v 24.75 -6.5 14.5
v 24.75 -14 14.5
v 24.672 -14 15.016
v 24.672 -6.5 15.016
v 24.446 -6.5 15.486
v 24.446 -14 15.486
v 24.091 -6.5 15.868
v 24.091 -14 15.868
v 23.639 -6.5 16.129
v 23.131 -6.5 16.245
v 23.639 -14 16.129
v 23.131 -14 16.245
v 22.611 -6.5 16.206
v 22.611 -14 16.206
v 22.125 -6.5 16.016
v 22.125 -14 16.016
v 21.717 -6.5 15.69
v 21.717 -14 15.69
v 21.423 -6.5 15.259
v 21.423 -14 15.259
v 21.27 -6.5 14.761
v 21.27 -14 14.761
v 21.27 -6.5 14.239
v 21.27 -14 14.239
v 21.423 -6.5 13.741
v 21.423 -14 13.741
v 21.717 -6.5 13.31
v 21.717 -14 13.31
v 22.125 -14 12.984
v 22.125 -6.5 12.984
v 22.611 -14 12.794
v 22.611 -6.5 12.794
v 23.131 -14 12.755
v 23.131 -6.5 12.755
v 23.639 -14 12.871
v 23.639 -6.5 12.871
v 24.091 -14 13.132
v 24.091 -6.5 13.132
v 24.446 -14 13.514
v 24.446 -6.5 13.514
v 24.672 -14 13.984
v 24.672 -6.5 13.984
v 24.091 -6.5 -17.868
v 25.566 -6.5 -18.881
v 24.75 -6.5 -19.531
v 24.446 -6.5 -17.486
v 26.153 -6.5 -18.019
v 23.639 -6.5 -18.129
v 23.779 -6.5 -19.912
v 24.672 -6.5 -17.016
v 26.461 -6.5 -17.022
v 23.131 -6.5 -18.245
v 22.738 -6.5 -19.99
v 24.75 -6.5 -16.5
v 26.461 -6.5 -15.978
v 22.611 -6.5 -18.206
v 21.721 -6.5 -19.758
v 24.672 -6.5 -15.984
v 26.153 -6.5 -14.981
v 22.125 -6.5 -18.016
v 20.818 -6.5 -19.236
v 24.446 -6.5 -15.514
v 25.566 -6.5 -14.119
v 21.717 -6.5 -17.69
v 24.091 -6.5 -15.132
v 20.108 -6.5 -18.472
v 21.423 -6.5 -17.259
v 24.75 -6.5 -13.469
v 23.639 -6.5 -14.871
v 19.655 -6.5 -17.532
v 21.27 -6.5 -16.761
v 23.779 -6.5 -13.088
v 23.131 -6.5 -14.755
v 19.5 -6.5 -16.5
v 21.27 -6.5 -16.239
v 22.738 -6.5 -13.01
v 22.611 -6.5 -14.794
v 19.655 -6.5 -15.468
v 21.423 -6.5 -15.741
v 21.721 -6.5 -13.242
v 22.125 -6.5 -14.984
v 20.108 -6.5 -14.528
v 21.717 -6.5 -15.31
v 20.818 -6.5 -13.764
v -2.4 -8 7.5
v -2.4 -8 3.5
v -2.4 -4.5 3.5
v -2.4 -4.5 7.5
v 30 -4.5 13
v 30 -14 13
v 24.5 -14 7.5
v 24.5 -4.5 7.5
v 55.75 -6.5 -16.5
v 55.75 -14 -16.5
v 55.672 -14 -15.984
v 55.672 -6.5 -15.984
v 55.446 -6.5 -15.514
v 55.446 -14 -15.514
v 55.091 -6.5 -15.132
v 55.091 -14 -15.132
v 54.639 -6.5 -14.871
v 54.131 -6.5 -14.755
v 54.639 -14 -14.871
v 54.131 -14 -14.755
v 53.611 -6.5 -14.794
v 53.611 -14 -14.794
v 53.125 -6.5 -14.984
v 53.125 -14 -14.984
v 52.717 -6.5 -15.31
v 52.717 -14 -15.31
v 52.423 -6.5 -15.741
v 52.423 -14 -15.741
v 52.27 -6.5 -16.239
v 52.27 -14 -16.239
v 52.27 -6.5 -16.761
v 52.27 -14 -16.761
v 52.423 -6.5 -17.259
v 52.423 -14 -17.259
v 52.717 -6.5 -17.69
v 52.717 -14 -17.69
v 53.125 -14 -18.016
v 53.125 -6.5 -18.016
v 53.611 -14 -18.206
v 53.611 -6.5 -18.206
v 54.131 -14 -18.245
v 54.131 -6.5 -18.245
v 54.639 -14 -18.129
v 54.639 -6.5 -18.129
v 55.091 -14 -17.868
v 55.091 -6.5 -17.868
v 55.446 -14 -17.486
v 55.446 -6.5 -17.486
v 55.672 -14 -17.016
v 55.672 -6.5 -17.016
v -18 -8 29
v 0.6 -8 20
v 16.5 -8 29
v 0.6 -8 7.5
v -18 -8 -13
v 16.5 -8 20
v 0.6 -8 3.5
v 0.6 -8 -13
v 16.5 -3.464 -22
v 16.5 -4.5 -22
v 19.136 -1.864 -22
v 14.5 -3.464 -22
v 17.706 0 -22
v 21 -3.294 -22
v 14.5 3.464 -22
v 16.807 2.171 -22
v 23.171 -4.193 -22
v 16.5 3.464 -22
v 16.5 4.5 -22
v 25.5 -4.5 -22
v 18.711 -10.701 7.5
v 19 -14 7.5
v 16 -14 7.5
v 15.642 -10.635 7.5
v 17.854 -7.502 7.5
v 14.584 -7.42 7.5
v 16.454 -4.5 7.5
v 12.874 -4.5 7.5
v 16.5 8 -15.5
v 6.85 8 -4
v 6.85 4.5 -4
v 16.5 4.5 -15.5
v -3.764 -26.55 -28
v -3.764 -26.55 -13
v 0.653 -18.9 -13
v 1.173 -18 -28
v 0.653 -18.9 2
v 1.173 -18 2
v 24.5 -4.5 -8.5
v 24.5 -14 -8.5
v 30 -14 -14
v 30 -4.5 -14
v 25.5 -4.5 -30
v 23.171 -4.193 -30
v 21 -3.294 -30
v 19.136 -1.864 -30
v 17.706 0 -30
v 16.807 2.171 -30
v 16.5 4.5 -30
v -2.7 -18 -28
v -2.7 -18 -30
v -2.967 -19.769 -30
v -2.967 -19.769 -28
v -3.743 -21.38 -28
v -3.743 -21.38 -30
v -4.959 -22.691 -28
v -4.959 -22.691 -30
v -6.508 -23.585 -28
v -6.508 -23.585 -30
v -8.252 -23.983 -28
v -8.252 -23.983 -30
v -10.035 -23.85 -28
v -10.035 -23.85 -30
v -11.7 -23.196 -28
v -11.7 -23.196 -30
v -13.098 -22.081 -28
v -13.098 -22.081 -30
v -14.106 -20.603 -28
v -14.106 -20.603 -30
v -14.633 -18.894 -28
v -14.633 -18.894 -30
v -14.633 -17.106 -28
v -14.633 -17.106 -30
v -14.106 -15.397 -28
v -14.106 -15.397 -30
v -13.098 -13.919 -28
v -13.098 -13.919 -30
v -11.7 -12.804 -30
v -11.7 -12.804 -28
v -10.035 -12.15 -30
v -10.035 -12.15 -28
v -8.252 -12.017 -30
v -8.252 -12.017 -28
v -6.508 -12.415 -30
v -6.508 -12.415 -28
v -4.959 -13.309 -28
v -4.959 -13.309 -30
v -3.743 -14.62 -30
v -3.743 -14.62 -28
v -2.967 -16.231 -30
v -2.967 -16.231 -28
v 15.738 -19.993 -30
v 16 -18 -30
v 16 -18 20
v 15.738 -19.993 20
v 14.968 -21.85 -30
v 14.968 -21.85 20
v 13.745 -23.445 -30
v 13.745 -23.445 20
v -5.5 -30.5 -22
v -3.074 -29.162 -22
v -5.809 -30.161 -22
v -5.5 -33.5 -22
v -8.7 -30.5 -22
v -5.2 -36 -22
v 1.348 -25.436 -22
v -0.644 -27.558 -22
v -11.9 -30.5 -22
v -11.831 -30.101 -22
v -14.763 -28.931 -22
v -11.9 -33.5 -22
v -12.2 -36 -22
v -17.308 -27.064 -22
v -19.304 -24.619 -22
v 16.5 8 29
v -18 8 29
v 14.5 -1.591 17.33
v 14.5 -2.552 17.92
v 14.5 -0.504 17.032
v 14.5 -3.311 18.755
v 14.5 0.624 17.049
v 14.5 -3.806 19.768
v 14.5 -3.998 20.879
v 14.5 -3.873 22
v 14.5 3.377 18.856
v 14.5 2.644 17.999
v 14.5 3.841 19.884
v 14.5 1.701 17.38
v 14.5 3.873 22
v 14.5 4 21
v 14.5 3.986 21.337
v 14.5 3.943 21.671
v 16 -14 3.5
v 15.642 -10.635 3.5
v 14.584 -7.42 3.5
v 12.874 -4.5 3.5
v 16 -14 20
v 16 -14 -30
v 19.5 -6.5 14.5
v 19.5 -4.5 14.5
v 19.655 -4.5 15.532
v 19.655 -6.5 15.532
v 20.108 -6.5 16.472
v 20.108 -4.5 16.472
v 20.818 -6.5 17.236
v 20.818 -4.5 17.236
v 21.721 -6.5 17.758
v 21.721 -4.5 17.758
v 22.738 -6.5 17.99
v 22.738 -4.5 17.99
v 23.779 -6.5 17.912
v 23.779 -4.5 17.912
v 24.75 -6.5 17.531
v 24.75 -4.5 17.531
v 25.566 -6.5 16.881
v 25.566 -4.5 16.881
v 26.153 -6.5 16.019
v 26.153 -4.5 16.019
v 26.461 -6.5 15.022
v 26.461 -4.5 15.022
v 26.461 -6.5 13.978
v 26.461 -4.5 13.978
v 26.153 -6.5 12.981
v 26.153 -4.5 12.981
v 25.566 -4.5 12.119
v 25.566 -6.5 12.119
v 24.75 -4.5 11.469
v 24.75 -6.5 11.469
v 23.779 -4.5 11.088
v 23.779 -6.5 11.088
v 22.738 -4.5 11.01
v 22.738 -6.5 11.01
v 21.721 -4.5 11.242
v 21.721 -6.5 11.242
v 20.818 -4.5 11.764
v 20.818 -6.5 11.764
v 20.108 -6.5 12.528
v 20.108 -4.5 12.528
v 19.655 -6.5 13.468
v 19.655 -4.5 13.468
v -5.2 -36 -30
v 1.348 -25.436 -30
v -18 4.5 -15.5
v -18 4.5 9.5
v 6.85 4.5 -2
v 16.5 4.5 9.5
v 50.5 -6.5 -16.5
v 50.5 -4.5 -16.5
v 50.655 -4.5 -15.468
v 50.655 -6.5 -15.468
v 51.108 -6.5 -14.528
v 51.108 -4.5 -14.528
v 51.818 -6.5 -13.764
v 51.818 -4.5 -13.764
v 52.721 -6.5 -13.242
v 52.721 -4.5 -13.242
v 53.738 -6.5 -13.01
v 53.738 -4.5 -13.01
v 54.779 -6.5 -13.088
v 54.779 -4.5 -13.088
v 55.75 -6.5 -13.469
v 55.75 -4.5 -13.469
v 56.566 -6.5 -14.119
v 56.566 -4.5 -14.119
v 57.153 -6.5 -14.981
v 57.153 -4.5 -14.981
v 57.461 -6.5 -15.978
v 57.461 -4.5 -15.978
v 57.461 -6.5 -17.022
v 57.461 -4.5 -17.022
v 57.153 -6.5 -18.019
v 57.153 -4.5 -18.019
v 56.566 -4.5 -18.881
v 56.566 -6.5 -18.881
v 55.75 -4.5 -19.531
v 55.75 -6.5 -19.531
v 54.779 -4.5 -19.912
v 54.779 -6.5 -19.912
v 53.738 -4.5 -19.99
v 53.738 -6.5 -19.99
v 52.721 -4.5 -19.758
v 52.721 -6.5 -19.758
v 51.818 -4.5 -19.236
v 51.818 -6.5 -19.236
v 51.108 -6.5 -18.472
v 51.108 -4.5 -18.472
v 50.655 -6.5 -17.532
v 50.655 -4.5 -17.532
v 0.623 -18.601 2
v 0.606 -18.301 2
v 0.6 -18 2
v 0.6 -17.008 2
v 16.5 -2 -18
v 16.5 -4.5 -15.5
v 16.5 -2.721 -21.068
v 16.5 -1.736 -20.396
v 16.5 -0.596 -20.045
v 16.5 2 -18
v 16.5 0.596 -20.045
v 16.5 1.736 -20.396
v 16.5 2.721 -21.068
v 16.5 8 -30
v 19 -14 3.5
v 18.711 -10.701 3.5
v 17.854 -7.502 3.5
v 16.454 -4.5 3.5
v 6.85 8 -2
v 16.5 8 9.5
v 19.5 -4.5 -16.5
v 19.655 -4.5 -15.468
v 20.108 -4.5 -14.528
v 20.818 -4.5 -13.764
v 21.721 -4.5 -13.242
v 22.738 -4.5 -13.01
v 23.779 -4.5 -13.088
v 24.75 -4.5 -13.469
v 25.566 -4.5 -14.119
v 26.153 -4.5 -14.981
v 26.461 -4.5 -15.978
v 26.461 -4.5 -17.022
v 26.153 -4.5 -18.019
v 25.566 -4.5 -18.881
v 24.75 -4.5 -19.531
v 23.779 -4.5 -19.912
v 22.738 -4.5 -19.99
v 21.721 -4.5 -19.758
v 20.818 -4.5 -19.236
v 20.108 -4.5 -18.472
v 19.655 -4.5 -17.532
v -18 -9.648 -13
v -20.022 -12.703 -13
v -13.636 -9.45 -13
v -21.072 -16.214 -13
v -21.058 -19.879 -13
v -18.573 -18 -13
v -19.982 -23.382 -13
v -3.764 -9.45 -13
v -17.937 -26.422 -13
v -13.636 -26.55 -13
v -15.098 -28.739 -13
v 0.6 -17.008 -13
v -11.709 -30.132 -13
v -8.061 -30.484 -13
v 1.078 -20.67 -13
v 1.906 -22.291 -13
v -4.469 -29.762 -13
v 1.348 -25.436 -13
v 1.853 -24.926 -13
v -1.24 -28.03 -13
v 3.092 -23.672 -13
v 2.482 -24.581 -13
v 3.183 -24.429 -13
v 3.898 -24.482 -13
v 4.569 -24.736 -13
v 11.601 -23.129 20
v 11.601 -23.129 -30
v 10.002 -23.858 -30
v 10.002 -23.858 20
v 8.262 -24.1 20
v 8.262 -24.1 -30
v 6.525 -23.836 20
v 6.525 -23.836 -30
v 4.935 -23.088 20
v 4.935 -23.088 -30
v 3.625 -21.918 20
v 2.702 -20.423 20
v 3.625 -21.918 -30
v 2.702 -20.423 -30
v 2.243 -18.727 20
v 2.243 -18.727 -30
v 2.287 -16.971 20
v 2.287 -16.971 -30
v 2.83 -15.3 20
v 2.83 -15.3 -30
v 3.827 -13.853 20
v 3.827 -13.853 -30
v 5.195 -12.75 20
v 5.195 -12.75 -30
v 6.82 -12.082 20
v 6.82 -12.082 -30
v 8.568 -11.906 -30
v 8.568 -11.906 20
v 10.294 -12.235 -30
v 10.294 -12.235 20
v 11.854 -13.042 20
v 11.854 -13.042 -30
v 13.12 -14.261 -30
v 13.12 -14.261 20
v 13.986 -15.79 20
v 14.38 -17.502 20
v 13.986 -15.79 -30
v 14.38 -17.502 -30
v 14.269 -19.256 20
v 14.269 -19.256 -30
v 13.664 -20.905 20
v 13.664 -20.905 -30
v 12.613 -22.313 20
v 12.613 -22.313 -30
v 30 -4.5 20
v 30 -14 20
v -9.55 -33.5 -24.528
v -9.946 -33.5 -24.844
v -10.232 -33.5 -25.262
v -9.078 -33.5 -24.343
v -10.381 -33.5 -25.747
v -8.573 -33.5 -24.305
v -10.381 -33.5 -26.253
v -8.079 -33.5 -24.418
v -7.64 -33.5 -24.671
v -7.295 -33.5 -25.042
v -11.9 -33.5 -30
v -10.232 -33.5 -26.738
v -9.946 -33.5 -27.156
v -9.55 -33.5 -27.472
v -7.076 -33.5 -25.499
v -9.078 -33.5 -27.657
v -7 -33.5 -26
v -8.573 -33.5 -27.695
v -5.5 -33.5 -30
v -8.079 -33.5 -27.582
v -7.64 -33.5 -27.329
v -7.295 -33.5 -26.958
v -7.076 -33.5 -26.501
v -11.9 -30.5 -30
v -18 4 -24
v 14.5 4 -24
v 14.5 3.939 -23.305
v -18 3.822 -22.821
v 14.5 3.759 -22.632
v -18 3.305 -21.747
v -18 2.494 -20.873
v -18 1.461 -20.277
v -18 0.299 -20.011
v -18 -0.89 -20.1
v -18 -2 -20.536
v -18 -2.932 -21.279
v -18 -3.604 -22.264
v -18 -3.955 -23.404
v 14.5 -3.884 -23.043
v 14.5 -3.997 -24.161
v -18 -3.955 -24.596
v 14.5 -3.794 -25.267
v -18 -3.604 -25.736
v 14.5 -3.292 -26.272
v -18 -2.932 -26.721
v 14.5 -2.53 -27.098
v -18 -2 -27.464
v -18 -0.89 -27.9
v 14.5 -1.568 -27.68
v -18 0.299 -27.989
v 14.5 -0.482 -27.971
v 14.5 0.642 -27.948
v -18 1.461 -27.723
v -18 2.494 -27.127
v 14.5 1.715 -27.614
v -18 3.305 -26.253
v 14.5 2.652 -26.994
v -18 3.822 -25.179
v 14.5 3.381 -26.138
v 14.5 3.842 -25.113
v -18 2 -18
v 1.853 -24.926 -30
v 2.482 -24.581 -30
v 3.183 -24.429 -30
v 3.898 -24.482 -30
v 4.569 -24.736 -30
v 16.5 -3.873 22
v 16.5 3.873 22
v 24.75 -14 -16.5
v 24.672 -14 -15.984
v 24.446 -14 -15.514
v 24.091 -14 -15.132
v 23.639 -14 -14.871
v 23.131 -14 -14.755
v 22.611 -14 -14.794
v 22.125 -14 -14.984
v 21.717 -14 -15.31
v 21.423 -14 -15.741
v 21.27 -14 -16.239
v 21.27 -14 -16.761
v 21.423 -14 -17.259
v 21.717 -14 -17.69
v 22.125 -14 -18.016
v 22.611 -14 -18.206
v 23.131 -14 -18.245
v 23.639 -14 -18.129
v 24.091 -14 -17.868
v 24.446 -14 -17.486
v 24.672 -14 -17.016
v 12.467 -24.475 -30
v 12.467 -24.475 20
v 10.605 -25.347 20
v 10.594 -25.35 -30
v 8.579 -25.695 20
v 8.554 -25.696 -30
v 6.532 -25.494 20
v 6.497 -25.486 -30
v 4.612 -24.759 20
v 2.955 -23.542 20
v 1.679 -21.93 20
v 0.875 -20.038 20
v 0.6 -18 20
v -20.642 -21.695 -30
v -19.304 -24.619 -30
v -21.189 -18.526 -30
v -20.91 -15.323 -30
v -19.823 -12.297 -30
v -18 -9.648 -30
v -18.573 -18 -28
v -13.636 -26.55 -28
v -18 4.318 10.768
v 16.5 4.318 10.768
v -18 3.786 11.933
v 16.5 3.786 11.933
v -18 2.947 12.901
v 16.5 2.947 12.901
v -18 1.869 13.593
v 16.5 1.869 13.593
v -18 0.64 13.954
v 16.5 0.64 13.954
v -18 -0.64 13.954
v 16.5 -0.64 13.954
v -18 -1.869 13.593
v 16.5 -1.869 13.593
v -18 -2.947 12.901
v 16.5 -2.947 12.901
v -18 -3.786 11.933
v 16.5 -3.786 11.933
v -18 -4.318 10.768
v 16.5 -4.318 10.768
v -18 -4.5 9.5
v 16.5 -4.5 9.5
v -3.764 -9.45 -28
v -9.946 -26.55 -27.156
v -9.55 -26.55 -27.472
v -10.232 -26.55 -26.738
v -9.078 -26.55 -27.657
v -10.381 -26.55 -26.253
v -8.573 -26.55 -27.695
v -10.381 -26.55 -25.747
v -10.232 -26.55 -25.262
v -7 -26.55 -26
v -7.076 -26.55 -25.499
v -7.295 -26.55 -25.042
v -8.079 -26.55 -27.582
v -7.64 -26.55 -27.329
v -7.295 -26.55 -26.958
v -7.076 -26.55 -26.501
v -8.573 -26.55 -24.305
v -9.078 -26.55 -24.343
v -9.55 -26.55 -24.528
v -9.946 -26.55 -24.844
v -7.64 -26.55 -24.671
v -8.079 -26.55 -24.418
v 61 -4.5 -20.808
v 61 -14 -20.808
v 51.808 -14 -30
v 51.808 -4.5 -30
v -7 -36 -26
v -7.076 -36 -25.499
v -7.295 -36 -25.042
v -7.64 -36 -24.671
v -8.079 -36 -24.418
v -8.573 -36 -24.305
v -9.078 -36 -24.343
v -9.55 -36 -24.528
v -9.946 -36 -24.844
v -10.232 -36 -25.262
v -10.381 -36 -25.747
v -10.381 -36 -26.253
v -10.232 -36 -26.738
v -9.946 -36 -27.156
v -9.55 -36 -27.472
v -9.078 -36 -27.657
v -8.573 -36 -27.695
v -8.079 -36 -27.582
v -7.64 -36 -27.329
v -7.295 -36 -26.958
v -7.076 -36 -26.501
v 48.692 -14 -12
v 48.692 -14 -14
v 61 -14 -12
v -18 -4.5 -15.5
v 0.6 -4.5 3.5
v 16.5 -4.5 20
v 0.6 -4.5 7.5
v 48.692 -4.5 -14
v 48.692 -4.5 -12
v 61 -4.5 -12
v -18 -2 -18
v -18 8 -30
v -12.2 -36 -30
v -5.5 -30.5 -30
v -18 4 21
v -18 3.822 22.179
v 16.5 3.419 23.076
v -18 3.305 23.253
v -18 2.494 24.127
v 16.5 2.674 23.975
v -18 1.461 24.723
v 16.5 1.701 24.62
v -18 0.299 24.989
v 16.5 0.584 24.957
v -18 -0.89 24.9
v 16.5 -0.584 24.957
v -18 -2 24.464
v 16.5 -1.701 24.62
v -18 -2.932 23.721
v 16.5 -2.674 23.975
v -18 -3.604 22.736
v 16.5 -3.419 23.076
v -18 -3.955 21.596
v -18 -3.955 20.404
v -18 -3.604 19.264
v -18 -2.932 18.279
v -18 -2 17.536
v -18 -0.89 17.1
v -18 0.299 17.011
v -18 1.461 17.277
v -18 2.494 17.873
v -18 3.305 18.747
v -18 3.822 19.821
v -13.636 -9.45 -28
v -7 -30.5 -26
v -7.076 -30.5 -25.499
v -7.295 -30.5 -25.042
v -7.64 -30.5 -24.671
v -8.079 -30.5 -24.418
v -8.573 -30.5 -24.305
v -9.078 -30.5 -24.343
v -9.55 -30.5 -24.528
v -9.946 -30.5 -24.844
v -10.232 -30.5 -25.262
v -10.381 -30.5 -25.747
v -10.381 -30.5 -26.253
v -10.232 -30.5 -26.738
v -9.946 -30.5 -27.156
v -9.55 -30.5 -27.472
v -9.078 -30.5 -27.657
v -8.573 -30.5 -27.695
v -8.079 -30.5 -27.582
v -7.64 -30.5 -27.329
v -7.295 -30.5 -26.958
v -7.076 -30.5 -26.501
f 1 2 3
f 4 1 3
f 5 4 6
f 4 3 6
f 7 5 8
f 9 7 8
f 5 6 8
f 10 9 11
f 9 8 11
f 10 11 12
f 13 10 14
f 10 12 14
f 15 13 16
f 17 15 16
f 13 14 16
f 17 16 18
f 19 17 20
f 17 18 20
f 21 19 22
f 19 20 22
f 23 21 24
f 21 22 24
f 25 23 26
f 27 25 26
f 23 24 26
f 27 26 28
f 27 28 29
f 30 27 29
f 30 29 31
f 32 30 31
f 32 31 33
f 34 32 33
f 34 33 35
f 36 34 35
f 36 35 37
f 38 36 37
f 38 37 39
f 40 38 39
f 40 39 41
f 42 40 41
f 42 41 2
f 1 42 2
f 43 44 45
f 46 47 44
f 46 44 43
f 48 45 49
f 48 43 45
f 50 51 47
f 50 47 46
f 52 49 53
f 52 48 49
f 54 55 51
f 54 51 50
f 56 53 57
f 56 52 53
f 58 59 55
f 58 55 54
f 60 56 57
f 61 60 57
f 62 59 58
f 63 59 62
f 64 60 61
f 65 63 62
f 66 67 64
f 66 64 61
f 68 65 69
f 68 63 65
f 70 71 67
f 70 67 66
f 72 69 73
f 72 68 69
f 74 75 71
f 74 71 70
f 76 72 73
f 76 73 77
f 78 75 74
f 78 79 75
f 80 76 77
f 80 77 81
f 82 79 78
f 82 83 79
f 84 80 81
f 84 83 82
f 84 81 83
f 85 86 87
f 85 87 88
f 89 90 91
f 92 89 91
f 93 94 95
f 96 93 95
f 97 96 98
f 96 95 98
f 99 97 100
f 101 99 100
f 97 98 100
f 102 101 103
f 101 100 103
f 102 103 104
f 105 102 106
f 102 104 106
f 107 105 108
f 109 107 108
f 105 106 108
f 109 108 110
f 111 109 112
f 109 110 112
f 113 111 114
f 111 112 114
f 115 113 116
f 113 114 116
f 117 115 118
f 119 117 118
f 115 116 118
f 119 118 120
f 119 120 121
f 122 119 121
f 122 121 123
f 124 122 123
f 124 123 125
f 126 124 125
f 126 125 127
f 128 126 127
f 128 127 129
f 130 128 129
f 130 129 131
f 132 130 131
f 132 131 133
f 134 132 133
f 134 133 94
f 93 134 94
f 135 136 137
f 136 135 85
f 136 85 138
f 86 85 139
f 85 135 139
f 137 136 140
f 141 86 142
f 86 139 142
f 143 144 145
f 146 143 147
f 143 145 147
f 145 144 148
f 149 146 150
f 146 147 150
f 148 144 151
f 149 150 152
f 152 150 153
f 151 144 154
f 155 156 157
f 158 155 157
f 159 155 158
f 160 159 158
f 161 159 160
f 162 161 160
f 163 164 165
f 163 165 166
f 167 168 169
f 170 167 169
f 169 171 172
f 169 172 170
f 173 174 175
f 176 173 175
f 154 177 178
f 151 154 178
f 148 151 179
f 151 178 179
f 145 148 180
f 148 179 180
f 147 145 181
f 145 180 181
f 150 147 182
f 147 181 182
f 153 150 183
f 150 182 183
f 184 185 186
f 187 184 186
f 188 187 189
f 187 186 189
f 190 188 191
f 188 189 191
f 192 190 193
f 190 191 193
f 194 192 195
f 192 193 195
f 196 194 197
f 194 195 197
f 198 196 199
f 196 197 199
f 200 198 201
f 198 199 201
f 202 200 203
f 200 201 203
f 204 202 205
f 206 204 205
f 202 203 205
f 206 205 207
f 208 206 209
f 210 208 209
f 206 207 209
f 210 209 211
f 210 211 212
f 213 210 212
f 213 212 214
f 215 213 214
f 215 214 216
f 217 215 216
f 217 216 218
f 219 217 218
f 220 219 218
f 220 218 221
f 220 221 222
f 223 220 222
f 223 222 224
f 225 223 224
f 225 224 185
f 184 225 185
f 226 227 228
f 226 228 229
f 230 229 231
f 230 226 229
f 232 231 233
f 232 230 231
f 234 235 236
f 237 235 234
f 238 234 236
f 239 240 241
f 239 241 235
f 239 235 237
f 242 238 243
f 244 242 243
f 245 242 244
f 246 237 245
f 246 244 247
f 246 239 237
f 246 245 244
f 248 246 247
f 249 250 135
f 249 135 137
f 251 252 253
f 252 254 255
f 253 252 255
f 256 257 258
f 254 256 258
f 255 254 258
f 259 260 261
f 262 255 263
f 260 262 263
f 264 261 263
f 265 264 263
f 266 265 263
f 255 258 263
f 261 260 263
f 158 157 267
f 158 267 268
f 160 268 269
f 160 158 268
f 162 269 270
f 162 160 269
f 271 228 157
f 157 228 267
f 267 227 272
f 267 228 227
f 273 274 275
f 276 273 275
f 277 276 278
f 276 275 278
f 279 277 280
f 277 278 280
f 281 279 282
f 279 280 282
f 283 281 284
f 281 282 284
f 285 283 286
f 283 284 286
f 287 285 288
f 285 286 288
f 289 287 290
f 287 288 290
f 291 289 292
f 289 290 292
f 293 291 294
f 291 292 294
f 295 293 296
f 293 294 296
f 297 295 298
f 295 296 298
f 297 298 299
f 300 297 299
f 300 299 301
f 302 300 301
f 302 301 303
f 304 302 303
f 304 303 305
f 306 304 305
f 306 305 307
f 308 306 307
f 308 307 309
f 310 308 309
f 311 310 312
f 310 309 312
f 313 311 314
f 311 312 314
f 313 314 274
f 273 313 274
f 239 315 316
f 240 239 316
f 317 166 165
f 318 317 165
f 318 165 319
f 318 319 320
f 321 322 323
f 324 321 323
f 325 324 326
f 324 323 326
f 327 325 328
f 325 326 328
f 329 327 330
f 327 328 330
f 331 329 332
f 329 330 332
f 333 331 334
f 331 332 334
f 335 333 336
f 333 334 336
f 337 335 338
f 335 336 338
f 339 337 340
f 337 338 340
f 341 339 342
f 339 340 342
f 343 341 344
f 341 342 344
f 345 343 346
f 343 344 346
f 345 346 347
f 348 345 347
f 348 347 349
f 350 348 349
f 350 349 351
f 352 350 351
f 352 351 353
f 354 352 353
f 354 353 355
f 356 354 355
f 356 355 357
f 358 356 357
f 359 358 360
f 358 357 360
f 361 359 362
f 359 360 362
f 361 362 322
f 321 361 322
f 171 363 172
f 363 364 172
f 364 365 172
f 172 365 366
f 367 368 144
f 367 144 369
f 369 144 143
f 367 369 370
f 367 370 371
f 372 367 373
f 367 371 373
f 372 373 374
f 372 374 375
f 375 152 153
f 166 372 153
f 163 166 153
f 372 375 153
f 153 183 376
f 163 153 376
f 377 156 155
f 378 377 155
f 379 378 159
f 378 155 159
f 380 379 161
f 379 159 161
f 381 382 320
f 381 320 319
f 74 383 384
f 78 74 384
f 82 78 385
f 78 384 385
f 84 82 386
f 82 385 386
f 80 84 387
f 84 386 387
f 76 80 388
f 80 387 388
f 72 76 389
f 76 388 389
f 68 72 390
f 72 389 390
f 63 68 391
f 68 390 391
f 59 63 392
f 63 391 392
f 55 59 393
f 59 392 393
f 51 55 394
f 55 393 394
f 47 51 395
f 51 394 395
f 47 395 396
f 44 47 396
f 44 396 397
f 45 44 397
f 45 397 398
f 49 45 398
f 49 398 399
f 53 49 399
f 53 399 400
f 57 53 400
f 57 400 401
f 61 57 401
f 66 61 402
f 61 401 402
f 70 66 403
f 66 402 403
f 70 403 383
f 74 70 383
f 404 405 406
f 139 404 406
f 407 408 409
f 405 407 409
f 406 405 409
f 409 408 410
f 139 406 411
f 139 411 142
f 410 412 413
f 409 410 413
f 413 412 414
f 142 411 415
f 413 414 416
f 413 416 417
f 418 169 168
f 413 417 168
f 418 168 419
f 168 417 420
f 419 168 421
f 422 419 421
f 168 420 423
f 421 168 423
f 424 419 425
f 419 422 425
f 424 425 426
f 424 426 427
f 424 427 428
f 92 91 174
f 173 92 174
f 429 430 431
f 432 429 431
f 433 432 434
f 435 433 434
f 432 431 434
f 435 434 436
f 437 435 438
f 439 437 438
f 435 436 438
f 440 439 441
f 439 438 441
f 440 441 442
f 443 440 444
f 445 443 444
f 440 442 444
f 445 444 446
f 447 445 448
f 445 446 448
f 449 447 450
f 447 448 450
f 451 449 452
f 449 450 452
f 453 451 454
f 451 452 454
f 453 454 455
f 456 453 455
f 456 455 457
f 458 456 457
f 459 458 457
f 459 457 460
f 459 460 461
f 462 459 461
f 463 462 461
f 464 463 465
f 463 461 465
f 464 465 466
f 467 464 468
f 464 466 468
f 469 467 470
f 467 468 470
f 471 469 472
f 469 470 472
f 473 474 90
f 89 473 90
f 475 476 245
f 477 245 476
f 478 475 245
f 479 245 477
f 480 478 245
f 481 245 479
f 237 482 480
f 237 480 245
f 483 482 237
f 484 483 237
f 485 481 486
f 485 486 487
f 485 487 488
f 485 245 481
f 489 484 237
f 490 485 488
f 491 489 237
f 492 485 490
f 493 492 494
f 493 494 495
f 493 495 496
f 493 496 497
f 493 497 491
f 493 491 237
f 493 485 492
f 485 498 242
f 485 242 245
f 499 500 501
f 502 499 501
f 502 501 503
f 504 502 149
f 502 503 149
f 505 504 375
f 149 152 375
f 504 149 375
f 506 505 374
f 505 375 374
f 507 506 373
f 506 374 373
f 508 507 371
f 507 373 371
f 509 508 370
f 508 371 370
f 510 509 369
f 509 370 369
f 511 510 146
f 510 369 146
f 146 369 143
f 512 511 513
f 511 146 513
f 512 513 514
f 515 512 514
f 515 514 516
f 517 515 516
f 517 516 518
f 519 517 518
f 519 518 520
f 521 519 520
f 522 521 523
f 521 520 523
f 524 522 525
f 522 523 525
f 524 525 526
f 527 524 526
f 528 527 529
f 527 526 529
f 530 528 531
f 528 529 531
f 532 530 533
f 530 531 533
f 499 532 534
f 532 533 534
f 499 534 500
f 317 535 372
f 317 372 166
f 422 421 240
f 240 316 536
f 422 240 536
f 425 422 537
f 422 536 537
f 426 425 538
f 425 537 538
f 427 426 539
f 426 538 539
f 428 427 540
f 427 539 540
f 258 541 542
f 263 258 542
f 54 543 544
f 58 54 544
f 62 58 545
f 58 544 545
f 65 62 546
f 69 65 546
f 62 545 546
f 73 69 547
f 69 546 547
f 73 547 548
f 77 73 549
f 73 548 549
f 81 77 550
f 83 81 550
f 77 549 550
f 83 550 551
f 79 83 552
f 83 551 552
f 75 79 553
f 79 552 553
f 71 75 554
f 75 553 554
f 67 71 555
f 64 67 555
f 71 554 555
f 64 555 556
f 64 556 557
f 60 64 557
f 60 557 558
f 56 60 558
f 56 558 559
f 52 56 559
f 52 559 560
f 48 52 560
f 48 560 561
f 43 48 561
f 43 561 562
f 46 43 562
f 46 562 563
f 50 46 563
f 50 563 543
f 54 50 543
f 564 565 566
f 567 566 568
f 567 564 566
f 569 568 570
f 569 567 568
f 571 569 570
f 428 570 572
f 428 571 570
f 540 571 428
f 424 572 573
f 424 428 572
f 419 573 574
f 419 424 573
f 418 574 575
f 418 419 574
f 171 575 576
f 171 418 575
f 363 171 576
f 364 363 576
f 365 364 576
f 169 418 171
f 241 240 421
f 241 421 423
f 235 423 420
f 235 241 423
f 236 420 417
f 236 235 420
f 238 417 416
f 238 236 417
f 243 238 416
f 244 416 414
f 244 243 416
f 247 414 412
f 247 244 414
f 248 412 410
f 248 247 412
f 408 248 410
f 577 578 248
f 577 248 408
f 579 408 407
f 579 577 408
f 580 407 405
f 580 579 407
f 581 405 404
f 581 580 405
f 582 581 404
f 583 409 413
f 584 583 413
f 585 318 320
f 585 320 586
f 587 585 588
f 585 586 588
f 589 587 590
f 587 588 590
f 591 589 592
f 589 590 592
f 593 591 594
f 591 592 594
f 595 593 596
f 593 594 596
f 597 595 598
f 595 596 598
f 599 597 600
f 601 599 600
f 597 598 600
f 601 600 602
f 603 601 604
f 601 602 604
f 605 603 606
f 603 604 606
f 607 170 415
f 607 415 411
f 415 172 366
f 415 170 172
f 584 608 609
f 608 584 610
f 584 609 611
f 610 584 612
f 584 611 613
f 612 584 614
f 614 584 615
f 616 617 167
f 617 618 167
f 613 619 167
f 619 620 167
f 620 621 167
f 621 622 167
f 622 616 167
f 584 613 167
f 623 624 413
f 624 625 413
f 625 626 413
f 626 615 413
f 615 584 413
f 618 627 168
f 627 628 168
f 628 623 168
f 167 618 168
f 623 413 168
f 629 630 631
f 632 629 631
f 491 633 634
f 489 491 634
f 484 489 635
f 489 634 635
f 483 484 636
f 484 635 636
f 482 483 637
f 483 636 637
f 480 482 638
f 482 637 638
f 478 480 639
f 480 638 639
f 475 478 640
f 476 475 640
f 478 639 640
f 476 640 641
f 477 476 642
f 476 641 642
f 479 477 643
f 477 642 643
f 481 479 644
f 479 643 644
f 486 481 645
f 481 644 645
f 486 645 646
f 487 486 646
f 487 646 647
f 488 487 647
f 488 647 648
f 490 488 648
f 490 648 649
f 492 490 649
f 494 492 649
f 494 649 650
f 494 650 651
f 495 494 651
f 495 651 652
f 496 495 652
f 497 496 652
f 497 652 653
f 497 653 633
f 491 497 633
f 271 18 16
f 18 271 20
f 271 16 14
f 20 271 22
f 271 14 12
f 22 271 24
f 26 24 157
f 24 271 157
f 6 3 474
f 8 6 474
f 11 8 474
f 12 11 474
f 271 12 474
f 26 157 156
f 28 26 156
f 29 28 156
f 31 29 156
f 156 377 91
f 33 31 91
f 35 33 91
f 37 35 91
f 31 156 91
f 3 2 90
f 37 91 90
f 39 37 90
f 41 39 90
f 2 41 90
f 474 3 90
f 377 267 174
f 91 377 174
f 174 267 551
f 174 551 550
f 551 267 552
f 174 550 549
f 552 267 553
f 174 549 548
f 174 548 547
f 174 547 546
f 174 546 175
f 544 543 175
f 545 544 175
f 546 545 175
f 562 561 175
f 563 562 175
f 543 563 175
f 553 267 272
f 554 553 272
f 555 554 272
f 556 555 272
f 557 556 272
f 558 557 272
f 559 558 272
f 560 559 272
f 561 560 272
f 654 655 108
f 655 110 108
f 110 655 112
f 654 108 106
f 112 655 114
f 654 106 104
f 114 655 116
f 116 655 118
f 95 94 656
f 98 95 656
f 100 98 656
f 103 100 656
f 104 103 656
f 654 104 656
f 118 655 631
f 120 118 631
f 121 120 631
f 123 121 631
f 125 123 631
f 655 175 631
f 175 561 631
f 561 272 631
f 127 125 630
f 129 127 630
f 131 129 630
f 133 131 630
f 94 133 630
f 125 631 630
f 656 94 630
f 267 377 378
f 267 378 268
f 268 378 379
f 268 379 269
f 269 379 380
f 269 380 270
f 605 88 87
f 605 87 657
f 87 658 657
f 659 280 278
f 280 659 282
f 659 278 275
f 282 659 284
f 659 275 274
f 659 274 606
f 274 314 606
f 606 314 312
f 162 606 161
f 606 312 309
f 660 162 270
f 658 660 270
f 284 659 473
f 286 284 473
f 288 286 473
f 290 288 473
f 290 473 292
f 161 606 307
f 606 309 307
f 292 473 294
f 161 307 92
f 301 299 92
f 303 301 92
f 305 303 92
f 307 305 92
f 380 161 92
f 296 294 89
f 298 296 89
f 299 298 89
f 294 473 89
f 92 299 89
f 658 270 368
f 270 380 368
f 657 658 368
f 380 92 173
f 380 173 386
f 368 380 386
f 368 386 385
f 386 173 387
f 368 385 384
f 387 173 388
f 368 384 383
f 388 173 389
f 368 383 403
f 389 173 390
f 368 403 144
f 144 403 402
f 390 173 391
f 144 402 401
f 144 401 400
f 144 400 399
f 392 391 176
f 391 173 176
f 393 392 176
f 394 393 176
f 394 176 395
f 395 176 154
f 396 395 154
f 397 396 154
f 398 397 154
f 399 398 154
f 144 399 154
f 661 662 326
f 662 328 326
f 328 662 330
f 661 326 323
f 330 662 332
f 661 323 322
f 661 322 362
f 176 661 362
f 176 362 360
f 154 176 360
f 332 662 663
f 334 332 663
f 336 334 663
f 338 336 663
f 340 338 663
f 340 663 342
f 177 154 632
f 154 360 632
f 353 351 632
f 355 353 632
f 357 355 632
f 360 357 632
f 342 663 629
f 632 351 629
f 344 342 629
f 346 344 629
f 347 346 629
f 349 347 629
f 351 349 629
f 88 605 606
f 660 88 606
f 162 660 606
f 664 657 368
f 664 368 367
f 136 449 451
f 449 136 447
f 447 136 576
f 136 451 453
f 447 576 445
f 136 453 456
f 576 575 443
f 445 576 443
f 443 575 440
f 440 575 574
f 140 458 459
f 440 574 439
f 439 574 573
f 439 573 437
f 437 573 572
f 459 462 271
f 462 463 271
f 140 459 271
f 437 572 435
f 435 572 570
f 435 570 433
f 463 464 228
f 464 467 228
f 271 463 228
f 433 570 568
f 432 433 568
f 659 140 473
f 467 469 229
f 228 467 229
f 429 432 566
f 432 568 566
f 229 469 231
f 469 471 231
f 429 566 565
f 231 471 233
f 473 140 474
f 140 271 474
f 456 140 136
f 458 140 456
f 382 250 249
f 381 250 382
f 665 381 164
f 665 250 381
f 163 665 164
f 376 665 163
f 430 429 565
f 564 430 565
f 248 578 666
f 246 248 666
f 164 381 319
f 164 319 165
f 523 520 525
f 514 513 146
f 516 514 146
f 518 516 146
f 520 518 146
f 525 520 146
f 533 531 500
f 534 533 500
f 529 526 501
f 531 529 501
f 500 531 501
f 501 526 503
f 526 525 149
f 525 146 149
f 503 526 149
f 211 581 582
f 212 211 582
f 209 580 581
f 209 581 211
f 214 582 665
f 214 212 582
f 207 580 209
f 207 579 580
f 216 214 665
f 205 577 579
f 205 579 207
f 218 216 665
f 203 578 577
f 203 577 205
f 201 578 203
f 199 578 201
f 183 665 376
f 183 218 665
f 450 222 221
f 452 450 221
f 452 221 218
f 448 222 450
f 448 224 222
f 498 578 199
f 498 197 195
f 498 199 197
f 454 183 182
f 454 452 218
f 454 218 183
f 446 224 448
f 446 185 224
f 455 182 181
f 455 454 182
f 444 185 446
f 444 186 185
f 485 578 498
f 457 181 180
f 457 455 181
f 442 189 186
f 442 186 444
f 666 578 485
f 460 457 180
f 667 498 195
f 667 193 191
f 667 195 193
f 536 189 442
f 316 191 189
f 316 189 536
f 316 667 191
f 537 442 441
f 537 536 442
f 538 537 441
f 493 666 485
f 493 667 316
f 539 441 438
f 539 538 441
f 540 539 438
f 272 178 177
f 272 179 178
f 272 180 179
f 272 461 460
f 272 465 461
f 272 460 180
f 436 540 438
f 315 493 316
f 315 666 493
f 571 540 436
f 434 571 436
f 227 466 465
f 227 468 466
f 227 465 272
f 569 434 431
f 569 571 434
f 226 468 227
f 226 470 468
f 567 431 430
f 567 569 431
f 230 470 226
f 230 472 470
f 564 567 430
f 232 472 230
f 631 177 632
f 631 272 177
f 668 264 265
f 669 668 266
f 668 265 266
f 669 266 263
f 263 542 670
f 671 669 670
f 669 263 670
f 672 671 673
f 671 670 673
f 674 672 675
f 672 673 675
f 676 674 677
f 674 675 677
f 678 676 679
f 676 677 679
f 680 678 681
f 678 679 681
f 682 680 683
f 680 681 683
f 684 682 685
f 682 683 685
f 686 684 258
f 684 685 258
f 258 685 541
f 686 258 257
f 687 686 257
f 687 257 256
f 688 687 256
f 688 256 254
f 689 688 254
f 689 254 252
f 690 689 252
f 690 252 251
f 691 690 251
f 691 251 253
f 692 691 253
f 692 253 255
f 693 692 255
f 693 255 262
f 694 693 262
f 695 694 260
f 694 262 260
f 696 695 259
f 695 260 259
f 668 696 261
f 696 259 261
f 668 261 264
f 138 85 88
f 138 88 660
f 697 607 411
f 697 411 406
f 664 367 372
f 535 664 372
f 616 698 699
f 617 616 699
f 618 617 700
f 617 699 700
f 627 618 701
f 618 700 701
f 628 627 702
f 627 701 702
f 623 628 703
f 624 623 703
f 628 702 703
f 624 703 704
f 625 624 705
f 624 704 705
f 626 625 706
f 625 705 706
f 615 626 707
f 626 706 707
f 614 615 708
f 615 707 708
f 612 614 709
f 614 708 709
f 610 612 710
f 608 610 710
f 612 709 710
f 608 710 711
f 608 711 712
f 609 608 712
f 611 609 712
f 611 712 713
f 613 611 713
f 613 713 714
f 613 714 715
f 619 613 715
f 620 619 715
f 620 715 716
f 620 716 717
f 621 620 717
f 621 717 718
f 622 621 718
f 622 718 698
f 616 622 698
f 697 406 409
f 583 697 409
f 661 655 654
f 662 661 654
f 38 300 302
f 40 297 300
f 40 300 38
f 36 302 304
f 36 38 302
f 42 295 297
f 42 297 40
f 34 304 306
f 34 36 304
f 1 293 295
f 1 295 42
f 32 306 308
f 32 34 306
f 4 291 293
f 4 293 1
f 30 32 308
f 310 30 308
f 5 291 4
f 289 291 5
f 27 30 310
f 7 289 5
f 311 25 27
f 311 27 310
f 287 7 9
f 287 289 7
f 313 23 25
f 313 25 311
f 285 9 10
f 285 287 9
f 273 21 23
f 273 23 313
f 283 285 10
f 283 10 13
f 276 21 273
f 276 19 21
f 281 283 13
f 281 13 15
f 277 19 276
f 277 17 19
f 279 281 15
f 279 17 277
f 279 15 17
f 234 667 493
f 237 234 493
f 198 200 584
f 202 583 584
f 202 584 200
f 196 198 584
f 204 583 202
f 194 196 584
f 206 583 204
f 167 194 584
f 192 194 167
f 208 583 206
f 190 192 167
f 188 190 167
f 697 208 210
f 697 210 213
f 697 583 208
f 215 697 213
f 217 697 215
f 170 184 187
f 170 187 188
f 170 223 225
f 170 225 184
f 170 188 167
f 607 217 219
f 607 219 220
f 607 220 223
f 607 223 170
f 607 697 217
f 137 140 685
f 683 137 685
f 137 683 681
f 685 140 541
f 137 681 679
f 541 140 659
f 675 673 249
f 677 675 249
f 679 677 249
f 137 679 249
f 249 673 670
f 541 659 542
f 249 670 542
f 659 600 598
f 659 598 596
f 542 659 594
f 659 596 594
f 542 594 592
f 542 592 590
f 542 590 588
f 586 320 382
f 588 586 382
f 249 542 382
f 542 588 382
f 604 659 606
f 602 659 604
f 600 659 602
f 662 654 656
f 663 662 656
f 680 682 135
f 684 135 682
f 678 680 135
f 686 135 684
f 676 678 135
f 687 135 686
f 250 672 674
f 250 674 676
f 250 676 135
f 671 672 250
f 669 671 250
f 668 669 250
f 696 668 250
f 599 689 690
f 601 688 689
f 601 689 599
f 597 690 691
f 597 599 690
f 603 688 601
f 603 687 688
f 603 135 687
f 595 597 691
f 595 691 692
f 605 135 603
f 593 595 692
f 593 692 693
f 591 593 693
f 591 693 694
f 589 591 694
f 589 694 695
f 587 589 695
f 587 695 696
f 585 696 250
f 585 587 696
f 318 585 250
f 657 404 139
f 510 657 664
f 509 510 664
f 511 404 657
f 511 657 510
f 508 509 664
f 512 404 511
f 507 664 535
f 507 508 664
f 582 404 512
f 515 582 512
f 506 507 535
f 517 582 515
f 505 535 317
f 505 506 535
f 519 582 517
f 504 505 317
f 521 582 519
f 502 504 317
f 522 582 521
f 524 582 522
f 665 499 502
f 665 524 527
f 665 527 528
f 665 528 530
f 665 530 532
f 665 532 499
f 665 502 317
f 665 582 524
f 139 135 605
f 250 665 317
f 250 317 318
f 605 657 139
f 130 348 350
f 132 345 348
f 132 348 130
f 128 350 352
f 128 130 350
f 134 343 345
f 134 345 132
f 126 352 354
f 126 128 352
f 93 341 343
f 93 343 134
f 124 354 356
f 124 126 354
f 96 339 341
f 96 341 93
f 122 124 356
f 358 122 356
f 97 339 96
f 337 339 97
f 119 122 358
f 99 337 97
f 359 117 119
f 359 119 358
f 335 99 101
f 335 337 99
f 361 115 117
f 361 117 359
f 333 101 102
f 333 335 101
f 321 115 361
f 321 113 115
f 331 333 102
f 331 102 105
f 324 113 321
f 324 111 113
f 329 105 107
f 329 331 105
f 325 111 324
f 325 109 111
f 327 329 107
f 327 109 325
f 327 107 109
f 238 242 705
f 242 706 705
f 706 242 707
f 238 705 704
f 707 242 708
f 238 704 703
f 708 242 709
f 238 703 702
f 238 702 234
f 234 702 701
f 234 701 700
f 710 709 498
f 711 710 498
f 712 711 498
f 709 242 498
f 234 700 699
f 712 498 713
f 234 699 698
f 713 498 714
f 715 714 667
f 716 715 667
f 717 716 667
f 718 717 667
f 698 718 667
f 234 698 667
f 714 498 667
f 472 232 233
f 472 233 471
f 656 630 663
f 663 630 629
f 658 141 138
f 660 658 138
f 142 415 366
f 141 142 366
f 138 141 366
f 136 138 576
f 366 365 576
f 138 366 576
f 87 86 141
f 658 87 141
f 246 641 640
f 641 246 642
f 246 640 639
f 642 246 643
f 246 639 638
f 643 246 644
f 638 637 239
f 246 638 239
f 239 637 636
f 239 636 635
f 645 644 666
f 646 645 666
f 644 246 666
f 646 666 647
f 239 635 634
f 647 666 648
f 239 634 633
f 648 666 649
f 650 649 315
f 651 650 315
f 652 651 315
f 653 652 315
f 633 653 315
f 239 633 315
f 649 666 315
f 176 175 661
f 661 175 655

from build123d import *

# Parameters (mm, degrees)
BOX_W           = 34.5
BOX_H           = 16
BOX_DEPTH       = 59
SKETCH_R        = 4
POCKET_DEPTH    = 34.501
POCKET001_DEPTH = 3.5000000001
BOX001_W        = 45
BOX001_H        = 9.5
BOX001_DEPTH    = 50
SKETCH008_R     = 1.75
POCKET002_DEPTH = 9.5010000001
PAD_DEPTH       = 8
PAD001_DEPTH    = 2
SKETCH009_R     = 3.5
POCKET003_DEPTH = 2
PAD002_DEPTH    = 50
SKETCH013_R     = 6
PAD003_DEPTH    = 17
SKETCH019_W     = 9
SKETCH019_H     = 5.5
PAD004_DEPTH    = 2
SKETCH015_W     = 3
SKETCH015_H     = 4
GROOVE_ANGLE    = 40
SKETCH016_W     = 3
SKETCH016_H     = 4
POCKET004_DEPTH = 5
SKETCH020_W     = 6.4
SKETCH020_H     = 3
PAD005_DEPTH    = 8
SKETCH021_R     = 1.7
POCKET005_DEPTH = 13
POCKET006_DEPTH = 15
PAD006_DEPTH    = 17


with BuildPart() as pocket001:
    # Box → Box (new body)
    with BuildSketch(Plane(origin=(-18, -8, -30), x_dir=(1, 0, 0), z_dir=(0, 0, 1))):
        with Locations((17.25, 8)):
            Rectangle(BOX_W, BOX_H)
    extrude(amount=BOX_DEPTH)

    # Sketch → Pocket (cut, through all)
    with BuildSketch(Plane(origin=(16.5, -8, -30), x_dir=(0, 1, 0), z_dir=(1, 0, 0))):
        with Locations((8, 51)):
            Circle(SKETCH_R)
        with Locations((8, 6)):
            Circle(SKETCH_R)
        with BuildLine():
            ThreePointArc((12.5, 39.4999793754), (8.0000103123, 44), (3.5, 39.5))
            Line((3.5, 39.5), (3.5, 14.5))
            Line((3.5, 14.5), (6, 12))
            Line((6, 12), (10, 12))
            Line((10, 12), (12.5, 14.5))
            Line((12.5, 14.5), (12.5, 39.4999793754))
        make_face()
    extrude(amount=-POCKET_DEPTH, mode=Mode.SUBTRACT)

    # Sketch007 → Pocket001 (cut)
    with BuildSketch(Plane(origin=(-18, 8, -30), x_dir=(-1, 0, 0), z_dir=(0, 1, 0))):
        Polygon((-34.5, 39.4999793754), (-24.8503628945, 27.9999896877), (-24.8503628945, 25.9999896877), (-34.5, 14.5), align=None)
    extrude(amount=-POCKET001_DEPTH, mode=Mode.SUBTRACT)


with BuildPart() as pad006:
    # Box001 → Box001 (new body)
    with BuildSketch(Plane(origin=(16, -14, -30), x_dir=(1, 0, 0), z_dir=(0, 0, 1))):
        with Locations((22.5, 4.75)):
            Rectangle(BOX001_W, BOX001_H)
    extrude(amount=BOX001_DEPTH)

    # Sketch008 → Pocket002 (cut, through all)
    with BuildSketch(Plane(origin=(16, -14, -30), x_dir=(1, 0, 0), z_dir=(0, -1, 0))):
        with Locations((7, 44.5)):
            Circle(SKETCH008_R)
        with Locations((7, 13.5)):
            Circle(SKETCH008_R)
        with Locations((38, 13.5)):
            Circle(SKETCH008_R)
        Polygon((14, 50), (14, 43), (8.5, 37.5), (8.5, 21.5), (14, 16), (32.692131, 16), (32.692131, 18), (45, 18), (45, 50), align=None)
        Polygon((45, 9.1923881554), (35.8076118446, 0), (45, 0), align=None)
    extrude(amount=-POCKET002_DEPTH, mode=Mode.SUBTRACT)

    # Fusion: union Pocket001
    add(pocket001.part)

    # Sketch010 → Pad (new body)
    with BuildSketch(Plane(origin=(0, 0, -30), x_dir=(1, 0, 0), z_dir=(0, 0, -1))):
        with BuildLine():
            ThreePointArc((25.4999662688, 4.4999999999), (19.1360389694, 1.8639610307), (16.5000000001, -4.4999662687))
            Line((16.5000000001, -4.4999662687), (16.5000000001, 4.4999999999))
            Line((16.5000000001, 4.4999999999), (25.4999662688, 4.4999999999))
        make_face()
    extrude(amount=-PAD_DEPTH)

    # Sketch011 → Pad001 (new body)
    with BuildSketch(Plane.YZ.offset(16.5)):
        with BuildLine():
            ThreePointArc((-3.4641016151, -22), (0, -28), (3.4641016151, -22))
            Line((-3.4641016151, -22), (3.4641016151, -22))
        make_face()
    extrude(amount=-PAD001_DEPTH)

    # Sketch009 → Pocket003 (cut)
    with BuildSketch(Plane(origin=(0, -4.5, 0), x_dir=(-1, 0, 0), z_dir=(0, 1, 0))):
        with Locations((-23, 14.5)):
            Circle(SKETCH009_R)
        with Locations((-54, -16.5)):
            Circle(SKETCH009_R)
        with Locations((-23, -16.5)):
            Circle(SKETCH009_R)
    extrude(amount=-POCKET003_DEPTH, mode=Mode.SUBTRACT)

    # Sketch012 → Pad002 (new body)
    with BuildSketch(Plane(origin=(0, 0, -30), x_dir=(1, 0, 0), z_dir=(0, 0, -1))):
        with BuildLine():
            ThreePointArc((15.9999999999, 18.0000351724), (15.4138656704, 20.9466786767), (13.7447222151, 23.4447222151))
            Line((13.7447222151, 23.4447222151), (12.6133513652, 22.3133513652))
            ThreePointArc((11.6013945082, 23.1294048681), (4.4708258711, 13.2515870556), (12.6133513652, 22.3133513652))
            Line((11.6013945082, 23.1294048681), (12.4673340514, 24.4748225384))
            ThreePointArc((12.4673340514, 24.4748225384), (4.6120940547, 24.759389746), (0.6000000001, 18.0000351024))
            Line((0.6000000001, 18.0000351024), (0.6000000001, 8))
            Line((0.6000000001, 8), (15.9999999999, 8))
            Line((15.9999999999, 18.0000351724), (15.9999999999, 8))
        make_face()
    extrude(amount=-PAD002_DEPTH)

    # Sketch013 → Pad003 (new body)
    with BuildSketch(Plane(origin=(0, 0, -30), x_dir=(1, 0, 0), z_dir=(0, 0, -1))):
        with BuildLine():
            ThreePointArc((1.3480393737, 25.435516441), (-17.5103595019, 26.8672185857), (-16.2, 8))
            Line((-16.2, 8), (0.6000000001, 8))
            Line((0.6000000001, 8), (0.6, 18.0000060082))
            ThreePointArc((4.5689954494, 24.7356963295), (1.6660458786, 21.9090475457), (0.6, 18.0000060082))
            ThreePointArc((1.3480393737, 25.435516441), (2.8268537634, 24.4796180457), (4.5689954493, 24.7356963295))
        make_face()
        with Locations((-8.7, 18)):
            Circle(SKETCH013_R, mode=Mode.SUBTRACT)
    extrude(amount=-PAD003_DEPTH)

    # Sketch019 → Pad004 (new body)
    with BuildSketch(Plane.YZ.offset(16.5)):
        with Locations((0, 19.25)):
            Rectangle(SKETCH019_W, SKETCH019_H)
    extrude(amount=-PAD004_DEPTH)

    # Sketch015 → Groove (revolve, cut)
    with BuildSketch(Plane.XZ.offset(14)):
        with Locations((17.5, 5.5)):
            Rectangle(SKETCH015_W, SKETCH015_H)
    revolve(axis=Axis((0, -14, 0), (0, 0, 1)), revolution_arc=GROOVE_ANGLE, mode=Mode.SUBTRACT)

    # Sketch016 → Pocket004 (cut)
    with BuildSketch(Plane.XZ.offset(8)):
        with Locations((-0.8999999999, 5.5)):
            Rectangle(SKETCH016_W, SKETCH016_H)
    extrude(amount=-POCKET004_DEPTH, mode=Mode.SUBTRACT)

    # Sketch020 → Pad005 (new body)
    with BuildSketch(Plane(origin=(0, 0, -30), x_dir=(1, 0, 0), z_dir=(0, 0, -1))):
        Polygon((-19.3039162536, 24.6186826549), (-12.2, 36), (-5.2, 36), (1.3480393737, 25.435516441), align=None)
        with Locations((-8.7, 32)):
            Rectangle(SKETCH020_W, SKETCH020_H, mode=Mode.SUBTRACT)
    extrude(amount=-PAD005_DEPTH)

    # Sketch021 → Pocket005 (cut)
    with BuildSketch(Plane.XZ.offset(36)):
        with Locations((-8.7, -26)):
            Circle(SKETCH021_R)
    extrude(amount=-POCKET005_DEPTH, mode=Mode.SUBTRACT)

    # Sketch022 → Pocket006 (cut, symmetric)
    with BuildSketch(Plane.XY.offset(-13)):
        Polygon((-3.7636551984, -26.55), (1.1726896031, -18), (-3.7636551984, -9.45), (-13.6363448016, -9.45), (-18.5726896031, -18), (-13.6363448016, -26.55), align=None)
    extrude(amount=POCKET006_DEPTH, both=True, mode=Mode.SUBTRACT)

    # Sketch024 → Pad006 (new body)
    with BuildSketch(Plane(origin=(0, 0, -30), x_dir=(1, 0, 0), z_dir=(0, 0, -1))):
        Polygon((-18, 9.6477547929), (-18, 8), (-16.2, 8), align=None)
    extrude(amount=-PAD006_DEPTH)


solid = pad006.part
